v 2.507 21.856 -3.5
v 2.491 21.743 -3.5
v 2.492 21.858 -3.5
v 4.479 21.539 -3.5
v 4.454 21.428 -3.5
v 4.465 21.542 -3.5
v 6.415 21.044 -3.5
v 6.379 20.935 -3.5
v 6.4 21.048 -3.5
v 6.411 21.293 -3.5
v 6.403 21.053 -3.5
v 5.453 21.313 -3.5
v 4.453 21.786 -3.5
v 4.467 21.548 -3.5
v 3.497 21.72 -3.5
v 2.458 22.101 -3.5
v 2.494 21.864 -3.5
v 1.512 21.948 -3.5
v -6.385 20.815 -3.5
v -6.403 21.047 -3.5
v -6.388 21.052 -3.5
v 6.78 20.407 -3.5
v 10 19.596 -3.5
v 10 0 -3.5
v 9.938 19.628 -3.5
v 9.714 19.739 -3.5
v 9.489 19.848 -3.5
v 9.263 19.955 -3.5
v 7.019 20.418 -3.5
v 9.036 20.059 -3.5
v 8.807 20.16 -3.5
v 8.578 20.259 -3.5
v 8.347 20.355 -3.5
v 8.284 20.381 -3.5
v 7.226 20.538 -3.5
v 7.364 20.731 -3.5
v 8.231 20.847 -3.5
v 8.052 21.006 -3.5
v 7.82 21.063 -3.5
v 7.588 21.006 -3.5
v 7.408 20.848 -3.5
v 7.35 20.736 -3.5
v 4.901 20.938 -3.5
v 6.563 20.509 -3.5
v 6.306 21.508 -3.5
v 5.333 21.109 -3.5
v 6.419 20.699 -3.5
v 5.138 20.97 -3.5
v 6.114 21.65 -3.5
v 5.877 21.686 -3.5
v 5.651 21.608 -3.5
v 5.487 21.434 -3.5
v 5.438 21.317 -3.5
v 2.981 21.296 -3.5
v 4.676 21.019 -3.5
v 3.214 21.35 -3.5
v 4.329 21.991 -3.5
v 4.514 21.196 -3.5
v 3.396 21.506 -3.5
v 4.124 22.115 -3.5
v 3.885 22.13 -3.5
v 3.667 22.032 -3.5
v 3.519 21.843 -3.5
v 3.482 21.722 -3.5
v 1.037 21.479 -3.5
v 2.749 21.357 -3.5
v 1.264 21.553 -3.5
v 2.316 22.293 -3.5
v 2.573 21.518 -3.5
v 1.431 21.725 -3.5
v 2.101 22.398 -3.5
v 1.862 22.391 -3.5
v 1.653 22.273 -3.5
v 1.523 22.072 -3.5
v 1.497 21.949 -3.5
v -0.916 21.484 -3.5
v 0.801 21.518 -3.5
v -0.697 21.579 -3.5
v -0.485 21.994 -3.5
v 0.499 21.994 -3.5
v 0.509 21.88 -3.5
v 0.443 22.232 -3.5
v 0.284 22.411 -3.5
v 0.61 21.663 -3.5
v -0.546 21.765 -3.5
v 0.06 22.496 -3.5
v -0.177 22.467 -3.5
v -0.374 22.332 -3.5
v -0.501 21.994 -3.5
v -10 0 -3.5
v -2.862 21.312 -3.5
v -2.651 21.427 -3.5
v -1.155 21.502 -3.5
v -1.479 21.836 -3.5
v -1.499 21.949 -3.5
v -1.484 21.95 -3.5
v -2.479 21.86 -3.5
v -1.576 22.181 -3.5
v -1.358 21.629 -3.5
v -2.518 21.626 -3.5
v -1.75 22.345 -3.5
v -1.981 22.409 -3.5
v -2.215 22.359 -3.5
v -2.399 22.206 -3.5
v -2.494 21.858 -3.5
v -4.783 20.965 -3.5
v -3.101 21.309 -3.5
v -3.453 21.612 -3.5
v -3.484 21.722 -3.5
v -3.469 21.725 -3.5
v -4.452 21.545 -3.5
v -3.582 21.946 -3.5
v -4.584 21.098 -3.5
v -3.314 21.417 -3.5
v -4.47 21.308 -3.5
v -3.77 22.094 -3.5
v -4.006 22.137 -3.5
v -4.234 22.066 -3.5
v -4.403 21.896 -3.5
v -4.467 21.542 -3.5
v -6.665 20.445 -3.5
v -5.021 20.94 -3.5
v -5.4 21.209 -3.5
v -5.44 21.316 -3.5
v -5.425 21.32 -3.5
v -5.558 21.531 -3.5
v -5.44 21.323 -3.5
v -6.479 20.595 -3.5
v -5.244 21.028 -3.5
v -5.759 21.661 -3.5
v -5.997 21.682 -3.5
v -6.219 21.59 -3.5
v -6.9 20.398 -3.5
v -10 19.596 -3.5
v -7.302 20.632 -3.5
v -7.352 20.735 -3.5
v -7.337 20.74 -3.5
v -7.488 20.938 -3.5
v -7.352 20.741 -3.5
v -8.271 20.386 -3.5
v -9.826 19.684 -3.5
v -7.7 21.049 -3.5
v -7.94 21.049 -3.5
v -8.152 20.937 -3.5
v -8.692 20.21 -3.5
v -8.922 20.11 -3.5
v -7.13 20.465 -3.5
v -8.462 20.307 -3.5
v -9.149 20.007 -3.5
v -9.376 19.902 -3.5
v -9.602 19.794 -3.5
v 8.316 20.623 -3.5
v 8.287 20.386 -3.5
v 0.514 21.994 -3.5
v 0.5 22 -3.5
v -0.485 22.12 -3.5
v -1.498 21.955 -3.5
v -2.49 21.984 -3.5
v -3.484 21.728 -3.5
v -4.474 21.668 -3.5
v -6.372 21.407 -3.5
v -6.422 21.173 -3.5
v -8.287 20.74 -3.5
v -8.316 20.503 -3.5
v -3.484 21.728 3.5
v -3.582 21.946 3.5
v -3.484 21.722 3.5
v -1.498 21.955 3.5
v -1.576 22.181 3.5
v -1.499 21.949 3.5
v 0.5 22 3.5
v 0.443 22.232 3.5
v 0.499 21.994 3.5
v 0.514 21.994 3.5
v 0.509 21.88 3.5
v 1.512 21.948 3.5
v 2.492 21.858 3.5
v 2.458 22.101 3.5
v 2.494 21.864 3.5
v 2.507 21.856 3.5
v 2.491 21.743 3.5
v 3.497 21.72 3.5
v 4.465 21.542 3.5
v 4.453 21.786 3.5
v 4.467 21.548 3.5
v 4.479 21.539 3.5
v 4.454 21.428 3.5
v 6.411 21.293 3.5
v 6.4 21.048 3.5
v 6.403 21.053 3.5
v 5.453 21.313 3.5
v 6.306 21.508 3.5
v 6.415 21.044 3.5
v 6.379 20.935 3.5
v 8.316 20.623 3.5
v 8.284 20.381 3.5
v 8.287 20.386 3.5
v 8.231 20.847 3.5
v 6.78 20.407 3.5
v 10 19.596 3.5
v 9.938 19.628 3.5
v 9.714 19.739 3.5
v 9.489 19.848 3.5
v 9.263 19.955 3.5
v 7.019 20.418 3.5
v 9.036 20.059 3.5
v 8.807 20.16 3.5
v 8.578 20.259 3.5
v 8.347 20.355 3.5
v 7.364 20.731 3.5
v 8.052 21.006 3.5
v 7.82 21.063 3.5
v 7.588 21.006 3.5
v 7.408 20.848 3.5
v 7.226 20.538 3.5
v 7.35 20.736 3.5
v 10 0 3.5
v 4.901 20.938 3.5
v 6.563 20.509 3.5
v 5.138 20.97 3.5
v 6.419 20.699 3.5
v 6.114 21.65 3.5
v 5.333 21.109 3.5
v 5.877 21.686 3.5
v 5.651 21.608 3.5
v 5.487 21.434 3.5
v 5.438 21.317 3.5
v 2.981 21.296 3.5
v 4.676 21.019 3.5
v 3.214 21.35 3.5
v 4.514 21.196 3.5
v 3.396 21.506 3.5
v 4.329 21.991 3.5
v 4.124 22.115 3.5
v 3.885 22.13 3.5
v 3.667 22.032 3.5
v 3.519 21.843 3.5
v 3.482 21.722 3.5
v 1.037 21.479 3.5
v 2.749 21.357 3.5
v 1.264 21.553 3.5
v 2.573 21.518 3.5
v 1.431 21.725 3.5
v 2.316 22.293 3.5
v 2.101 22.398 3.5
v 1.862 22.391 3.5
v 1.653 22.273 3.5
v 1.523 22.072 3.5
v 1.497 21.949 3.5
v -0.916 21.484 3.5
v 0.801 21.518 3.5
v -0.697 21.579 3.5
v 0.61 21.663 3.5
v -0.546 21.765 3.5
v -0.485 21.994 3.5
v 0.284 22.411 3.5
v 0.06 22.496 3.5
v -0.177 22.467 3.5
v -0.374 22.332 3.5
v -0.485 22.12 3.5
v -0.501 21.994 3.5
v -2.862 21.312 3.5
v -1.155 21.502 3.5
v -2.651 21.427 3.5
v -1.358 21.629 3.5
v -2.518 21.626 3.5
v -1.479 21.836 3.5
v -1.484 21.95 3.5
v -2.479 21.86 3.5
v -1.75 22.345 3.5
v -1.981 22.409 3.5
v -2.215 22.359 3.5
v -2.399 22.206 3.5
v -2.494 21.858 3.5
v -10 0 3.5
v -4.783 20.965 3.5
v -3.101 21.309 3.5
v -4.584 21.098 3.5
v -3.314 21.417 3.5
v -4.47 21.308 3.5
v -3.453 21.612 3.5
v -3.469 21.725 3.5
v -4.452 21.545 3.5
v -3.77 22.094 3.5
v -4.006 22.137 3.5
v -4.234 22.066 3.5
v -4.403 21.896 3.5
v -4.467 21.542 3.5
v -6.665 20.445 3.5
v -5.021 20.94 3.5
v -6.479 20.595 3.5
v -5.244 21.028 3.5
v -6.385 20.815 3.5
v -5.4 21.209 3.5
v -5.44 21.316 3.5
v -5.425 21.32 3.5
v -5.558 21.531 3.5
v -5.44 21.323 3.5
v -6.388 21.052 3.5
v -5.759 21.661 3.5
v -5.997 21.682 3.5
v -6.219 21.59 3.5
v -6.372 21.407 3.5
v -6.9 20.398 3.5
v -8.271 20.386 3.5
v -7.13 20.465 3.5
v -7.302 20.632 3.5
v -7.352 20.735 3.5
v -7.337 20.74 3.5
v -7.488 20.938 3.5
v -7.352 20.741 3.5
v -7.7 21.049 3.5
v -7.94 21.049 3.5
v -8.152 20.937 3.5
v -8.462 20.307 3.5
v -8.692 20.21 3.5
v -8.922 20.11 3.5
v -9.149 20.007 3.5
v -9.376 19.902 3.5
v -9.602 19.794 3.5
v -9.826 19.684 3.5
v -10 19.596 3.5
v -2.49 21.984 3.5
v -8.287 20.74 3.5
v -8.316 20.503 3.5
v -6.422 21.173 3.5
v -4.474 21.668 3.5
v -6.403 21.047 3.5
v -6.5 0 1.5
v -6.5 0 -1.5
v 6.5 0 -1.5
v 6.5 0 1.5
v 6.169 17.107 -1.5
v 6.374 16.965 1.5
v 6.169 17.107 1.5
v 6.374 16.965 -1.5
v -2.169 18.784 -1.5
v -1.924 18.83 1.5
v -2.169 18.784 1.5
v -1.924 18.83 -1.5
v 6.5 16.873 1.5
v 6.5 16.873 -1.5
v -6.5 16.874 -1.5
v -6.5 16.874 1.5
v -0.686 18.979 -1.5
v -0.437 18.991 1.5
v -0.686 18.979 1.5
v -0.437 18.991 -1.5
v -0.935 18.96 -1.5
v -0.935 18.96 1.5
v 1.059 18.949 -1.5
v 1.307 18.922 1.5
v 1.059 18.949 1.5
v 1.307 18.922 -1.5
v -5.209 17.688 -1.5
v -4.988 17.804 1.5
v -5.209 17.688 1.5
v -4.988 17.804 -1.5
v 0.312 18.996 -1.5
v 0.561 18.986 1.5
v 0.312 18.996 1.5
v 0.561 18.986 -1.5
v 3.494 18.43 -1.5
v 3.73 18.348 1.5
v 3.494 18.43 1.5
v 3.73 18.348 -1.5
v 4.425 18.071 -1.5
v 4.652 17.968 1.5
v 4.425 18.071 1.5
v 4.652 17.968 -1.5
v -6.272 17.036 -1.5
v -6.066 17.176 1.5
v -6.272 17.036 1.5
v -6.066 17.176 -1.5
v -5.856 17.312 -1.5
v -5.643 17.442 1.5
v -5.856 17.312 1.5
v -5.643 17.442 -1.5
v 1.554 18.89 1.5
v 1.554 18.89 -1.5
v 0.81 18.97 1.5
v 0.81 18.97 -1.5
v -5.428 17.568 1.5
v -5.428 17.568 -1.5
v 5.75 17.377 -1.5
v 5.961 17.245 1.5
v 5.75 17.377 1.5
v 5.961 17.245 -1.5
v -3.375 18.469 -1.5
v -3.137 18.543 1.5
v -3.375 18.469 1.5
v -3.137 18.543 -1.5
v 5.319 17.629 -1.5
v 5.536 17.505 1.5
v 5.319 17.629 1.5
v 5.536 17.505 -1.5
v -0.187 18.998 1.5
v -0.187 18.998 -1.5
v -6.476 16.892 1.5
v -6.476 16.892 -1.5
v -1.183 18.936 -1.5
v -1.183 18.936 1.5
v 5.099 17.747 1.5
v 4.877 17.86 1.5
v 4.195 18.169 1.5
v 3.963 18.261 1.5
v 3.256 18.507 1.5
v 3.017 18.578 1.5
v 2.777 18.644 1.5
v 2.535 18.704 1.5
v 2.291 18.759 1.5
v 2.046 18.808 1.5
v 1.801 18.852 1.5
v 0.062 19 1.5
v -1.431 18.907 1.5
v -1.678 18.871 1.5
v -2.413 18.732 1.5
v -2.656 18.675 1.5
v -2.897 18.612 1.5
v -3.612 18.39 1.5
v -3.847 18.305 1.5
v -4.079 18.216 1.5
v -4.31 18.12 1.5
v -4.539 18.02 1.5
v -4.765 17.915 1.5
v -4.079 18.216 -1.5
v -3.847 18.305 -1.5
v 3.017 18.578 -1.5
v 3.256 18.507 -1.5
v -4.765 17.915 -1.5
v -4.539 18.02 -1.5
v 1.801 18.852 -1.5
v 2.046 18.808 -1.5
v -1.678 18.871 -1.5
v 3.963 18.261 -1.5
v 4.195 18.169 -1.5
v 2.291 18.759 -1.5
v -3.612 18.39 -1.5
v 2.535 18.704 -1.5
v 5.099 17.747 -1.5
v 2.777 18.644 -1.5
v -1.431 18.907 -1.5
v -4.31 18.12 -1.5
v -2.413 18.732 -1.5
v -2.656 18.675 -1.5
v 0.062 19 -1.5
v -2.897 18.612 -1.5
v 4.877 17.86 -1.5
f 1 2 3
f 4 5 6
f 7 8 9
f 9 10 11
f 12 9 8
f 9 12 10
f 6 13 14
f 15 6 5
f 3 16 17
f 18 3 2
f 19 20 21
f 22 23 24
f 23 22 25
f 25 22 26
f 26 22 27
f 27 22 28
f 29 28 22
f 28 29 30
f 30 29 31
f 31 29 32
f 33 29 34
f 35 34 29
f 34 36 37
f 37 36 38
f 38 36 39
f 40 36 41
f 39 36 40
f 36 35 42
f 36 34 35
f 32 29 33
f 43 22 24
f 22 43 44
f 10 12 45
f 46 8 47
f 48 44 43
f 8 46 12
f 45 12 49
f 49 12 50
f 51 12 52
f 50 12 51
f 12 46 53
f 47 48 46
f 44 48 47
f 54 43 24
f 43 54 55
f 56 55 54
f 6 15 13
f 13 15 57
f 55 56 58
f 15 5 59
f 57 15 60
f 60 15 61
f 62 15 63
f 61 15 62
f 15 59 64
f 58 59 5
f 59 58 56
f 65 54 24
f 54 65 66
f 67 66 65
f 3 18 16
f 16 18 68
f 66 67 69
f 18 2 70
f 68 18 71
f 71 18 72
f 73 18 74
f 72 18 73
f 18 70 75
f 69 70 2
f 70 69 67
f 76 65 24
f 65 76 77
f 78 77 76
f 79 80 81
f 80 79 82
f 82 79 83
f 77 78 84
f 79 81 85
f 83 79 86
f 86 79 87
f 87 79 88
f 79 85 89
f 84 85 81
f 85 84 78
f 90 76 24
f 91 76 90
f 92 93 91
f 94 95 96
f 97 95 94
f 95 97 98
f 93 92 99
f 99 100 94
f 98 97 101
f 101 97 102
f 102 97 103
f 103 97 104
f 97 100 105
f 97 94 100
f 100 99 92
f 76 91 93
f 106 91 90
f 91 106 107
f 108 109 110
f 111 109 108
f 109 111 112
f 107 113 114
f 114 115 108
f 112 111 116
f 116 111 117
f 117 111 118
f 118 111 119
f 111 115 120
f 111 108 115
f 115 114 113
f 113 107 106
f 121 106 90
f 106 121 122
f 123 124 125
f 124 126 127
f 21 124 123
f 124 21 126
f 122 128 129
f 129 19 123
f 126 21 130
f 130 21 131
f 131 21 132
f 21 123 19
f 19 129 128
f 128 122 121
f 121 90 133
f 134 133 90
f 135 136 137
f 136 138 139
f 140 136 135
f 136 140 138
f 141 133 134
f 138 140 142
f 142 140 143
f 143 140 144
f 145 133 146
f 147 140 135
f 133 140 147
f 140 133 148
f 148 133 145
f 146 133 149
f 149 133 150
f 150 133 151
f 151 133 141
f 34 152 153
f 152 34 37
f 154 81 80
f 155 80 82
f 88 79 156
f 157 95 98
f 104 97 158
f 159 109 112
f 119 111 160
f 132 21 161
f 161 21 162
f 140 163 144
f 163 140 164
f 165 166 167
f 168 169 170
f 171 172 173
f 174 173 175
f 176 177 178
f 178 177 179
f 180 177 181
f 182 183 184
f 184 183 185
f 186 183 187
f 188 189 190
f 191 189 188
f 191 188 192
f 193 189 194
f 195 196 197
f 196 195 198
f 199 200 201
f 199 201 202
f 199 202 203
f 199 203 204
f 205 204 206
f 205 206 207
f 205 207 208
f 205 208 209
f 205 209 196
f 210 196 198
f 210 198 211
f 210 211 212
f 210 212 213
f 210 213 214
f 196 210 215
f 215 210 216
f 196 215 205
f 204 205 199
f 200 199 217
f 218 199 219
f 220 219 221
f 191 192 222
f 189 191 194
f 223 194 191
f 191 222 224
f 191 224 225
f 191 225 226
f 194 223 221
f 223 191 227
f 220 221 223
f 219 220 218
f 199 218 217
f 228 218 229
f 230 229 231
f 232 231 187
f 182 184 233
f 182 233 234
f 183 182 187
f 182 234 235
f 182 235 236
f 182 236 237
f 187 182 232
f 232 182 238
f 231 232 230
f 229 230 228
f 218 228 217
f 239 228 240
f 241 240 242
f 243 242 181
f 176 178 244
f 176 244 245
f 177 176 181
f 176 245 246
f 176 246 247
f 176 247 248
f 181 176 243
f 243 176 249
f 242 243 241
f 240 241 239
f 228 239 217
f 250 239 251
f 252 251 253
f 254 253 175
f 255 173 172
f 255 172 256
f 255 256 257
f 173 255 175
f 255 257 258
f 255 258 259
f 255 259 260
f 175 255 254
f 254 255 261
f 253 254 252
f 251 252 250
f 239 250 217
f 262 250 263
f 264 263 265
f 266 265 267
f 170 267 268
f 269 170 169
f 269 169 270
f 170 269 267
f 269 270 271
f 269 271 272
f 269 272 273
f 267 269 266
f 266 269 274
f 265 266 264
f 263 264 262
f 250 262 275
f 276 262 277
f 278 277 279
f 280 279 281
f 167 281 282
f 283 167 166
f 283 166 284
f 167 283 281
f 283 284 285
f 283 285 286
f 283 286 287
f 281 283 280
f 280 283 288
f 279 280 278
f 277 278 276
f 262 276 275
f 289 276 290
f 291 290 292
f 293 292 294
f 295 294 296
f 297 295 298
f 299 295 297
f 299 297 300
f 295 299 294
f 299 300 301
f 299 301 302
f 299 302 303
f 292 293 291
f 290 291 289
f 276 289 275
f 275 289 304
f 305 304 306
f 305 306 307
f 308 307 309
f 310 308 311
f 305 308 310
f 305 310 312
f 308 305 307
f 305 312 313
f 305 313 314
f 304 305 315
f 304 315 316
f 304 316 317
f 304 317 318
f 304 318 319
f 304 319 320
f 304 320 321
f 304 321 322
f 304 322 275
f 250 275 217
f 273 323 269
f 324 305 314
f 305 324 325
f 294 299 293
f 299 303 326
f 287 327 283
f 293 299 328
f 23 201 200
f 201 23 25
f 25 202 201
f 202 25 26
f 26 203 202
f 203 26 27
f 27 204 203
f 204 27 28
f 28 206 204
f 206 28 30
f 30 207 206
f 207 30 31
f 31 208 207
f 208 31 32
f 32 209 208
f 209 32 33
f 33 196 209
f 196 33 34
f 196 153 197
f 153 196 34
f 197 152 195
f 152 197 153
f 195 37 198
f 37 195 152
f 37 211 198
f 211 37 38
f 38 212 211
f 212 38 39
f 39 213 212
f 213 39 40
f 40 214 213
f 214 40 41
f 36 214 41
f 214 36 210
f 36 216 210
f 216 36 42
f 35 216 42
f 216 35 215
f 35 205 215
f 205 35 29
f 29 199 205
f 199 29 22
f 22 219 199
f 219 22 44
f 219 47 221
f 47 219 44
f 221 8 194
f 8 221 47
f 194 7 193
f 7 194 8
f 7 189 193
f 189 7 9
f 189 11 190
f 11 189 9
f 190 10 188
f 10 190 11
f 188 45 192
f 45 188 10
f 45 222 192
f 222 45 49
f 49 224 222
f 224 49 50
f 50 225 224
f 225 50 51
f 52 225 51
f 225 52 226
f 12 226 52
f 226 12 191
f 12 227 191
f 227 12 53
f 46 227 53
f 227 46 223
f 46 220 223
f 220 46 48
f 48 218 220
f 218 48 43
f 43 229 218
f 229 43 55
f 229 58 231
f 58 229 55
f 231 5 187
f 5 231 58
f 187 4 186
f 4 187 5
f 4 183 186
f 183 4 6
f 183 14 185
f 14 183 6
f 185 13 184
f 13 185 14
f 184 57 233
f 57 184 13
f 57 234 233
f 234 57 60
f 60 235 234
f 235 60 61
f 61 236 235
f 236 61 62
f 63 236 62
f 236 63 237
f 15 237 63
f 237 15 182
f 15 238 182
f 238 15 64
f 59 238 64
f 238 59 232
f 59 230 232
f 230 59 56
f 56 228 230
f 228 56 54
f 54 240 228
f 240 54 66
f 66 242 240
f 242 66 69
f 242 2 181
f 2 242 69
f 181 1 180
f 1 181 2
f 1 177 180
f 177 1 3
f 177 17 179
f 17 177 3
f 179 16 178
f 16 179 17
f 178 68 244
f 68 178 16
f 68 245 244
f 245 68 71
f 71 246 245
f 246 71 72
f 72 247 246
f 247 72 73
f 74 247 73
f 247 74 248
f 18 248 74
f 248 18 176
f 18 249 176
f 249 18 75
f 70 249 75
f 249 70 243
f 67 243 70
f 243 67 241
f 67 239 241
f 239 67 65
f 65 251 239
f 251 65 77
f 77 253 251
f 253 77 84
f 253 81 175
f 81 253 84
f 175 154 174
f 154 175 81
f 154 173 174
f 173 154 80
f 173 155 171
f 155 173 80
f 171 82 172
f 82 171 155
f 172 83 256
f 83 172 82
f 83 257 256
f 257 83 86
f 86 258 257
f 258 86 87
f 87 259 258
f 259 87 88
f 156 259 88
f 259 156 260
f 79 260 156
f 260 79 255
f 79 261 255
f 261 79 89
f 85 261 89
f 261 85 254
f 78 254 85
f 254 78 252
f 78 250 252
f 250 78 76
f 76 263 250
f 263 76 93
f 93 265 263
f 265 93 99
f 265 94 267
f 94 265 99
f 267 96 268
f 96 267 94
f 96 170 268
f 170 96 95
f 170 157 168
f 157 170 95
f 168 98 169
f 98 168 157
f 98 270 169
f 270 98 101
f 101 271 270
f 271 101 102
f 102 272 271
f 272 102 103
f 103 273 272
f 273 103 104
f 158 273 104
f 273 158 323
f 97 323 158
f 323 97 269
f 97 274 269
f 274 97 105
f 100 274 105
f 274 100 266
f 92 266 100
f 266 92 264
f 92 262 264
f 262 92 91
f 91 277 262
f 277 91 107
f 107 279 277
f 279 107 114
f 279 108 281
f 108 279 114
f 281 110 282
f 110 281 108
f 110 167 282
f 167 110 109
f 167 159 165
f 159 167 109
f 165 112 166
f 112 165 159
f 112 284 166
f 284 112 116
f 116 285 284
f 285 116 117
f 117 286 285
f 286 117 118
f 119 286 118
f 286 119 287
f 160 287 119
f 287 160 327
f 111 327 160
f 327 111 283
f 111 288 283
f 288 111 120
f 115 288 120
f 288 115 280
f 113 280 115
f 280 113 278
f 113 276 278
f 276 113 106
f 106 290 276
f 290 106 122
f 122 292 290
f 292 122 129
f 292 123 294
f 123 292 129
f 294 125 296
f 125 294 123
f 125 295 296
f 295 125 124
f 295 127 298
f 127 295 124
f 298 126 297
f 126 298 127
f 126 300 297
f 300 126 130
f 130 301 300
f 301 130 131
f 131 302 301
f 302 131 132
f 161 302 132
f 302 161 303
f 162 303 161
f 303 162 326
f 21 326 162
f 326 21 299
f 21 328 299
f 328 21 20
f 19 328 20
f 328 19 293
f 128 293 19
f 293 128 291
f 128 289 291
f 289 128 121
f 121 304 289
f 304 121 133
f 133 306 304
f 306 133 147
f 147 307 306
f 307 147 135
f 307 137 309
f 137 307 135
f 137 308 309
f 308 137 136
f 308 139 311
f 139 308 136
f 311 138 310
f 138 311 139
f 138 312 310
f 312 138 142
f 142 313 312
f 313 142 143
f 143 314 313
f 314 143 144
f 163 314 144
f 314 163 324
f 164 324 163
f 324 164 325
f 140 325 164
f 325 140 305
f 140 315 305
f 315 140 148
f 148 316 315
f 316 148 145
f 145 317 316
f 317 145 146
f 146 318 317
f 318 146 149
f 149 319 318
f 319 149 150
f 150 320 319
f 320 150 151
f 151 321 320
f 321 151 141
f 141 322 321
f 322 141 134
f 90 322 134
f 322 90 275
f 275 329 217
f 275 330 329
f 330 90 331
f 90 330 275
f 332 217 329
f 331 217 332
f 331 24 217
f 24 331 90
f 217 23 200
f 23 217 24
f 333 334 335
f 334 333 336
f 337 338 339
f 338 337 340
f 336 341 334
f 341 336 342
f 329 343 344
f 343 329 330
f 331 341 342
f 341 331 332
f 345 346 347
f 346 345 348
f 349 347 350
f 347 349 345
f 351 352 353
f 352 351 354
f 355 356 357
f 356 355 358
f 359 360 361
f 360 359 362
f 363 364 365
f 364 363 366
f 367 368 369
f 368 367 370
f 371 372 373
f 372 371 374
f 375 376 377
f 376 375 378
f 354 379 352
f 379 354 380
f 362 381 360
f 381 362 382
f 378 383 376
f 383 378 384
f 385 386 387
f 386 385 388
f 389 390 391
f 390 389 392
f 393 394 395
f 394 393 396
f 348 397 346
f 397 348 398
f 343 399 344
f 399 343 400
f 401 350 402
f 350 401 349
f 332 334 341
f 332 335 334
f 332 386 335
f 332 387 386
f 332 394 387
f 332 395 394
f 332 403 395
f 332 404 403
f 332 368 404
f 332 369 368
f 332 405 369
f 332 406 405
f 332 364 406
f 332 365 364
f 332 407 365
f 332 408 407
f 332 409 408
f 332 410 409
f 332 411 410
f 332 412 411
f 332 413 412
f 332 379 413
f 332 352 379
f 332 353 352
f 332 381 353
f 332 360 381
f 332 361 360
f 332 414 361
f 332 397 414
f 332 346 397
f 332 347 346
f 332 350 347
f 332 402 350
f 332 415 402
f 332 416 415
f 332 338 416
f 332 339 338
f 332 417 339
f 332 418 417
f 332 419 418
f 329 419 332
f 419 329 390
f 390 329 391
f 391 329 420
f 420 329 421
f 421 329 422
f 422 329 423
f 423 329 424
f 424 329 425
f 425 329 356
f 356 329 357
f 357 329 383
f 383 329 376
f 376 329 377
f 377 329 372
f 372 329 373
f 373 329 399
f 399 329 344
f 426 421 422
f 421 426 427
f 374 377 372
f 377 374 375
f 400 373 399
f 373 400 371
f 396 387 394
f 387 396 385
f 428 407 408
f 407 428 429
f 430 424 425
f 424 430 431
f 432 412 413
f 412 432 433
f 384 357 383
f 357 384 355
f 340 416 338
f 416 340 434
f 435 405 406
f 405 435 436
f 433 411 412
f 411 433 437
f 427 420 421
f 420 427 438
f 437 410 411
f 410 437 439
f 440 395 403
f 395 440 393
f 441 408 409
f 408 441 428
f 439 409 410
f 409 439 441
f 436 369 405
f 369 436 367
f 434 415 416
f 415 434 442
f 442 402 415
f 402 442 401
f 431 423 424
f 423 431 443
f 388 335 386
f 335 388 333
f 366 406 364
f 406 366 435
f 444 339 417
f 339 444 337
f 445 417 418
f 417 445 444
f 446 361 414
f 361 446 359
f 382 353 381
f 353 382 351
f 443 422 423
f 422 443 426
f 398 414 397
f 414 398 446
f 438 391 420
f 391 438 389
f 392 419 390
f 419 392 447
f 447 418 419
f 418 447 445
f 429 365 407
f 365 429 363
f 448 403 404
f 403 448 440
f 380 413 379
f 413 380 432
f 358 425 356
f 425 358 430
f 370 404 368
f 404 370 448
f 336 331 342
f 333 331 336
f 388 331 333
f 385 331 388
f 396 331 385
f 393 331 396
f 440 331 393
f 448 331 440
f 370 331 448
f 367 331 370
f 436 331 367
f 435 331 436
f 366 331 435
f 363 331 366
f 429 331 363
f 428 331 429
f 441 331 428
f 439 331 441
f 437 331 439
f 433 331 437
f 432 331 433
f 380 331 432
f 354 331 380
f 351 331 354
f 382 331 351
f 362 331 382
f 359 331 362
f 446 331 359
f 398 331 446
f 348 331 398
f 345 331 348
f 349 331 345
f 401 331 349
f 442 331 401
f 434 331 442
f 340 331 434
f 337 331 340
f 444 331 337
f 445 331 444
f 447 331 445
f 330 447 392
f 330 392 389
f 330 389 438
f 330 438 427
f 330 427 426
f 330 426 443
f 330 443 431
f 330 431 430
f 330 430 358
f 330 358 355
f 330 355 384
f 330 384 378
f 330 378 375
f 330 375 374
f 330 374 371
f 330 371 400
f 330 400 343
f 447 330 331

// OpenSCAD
$fa=1/4;
$fs=1/4;
module profile() {
  difference() {
    union() {
      intersection() {
        translate([-10,0])square([20,22]);
        circle(r=22);
      }
      for(a=[-8:2:8]) rotate(a*atan(1/22)) translate([0,22]) circle(d=1);
    }
    for(a=[-7:2:7]) rotate(a*atan(1/22)) translate([0,22]) circle(d=1);

  }
}
module inner_profile() {
  intersection() {
    translate([-6.5,0])square([13,19]);
    translate([0,8])circle(r=11);
  }
}
difference() {
  linear_extrude(height=7,center=true)profile();
  linear_extrude(height=3,center=true)inner_profile();
  }
  
